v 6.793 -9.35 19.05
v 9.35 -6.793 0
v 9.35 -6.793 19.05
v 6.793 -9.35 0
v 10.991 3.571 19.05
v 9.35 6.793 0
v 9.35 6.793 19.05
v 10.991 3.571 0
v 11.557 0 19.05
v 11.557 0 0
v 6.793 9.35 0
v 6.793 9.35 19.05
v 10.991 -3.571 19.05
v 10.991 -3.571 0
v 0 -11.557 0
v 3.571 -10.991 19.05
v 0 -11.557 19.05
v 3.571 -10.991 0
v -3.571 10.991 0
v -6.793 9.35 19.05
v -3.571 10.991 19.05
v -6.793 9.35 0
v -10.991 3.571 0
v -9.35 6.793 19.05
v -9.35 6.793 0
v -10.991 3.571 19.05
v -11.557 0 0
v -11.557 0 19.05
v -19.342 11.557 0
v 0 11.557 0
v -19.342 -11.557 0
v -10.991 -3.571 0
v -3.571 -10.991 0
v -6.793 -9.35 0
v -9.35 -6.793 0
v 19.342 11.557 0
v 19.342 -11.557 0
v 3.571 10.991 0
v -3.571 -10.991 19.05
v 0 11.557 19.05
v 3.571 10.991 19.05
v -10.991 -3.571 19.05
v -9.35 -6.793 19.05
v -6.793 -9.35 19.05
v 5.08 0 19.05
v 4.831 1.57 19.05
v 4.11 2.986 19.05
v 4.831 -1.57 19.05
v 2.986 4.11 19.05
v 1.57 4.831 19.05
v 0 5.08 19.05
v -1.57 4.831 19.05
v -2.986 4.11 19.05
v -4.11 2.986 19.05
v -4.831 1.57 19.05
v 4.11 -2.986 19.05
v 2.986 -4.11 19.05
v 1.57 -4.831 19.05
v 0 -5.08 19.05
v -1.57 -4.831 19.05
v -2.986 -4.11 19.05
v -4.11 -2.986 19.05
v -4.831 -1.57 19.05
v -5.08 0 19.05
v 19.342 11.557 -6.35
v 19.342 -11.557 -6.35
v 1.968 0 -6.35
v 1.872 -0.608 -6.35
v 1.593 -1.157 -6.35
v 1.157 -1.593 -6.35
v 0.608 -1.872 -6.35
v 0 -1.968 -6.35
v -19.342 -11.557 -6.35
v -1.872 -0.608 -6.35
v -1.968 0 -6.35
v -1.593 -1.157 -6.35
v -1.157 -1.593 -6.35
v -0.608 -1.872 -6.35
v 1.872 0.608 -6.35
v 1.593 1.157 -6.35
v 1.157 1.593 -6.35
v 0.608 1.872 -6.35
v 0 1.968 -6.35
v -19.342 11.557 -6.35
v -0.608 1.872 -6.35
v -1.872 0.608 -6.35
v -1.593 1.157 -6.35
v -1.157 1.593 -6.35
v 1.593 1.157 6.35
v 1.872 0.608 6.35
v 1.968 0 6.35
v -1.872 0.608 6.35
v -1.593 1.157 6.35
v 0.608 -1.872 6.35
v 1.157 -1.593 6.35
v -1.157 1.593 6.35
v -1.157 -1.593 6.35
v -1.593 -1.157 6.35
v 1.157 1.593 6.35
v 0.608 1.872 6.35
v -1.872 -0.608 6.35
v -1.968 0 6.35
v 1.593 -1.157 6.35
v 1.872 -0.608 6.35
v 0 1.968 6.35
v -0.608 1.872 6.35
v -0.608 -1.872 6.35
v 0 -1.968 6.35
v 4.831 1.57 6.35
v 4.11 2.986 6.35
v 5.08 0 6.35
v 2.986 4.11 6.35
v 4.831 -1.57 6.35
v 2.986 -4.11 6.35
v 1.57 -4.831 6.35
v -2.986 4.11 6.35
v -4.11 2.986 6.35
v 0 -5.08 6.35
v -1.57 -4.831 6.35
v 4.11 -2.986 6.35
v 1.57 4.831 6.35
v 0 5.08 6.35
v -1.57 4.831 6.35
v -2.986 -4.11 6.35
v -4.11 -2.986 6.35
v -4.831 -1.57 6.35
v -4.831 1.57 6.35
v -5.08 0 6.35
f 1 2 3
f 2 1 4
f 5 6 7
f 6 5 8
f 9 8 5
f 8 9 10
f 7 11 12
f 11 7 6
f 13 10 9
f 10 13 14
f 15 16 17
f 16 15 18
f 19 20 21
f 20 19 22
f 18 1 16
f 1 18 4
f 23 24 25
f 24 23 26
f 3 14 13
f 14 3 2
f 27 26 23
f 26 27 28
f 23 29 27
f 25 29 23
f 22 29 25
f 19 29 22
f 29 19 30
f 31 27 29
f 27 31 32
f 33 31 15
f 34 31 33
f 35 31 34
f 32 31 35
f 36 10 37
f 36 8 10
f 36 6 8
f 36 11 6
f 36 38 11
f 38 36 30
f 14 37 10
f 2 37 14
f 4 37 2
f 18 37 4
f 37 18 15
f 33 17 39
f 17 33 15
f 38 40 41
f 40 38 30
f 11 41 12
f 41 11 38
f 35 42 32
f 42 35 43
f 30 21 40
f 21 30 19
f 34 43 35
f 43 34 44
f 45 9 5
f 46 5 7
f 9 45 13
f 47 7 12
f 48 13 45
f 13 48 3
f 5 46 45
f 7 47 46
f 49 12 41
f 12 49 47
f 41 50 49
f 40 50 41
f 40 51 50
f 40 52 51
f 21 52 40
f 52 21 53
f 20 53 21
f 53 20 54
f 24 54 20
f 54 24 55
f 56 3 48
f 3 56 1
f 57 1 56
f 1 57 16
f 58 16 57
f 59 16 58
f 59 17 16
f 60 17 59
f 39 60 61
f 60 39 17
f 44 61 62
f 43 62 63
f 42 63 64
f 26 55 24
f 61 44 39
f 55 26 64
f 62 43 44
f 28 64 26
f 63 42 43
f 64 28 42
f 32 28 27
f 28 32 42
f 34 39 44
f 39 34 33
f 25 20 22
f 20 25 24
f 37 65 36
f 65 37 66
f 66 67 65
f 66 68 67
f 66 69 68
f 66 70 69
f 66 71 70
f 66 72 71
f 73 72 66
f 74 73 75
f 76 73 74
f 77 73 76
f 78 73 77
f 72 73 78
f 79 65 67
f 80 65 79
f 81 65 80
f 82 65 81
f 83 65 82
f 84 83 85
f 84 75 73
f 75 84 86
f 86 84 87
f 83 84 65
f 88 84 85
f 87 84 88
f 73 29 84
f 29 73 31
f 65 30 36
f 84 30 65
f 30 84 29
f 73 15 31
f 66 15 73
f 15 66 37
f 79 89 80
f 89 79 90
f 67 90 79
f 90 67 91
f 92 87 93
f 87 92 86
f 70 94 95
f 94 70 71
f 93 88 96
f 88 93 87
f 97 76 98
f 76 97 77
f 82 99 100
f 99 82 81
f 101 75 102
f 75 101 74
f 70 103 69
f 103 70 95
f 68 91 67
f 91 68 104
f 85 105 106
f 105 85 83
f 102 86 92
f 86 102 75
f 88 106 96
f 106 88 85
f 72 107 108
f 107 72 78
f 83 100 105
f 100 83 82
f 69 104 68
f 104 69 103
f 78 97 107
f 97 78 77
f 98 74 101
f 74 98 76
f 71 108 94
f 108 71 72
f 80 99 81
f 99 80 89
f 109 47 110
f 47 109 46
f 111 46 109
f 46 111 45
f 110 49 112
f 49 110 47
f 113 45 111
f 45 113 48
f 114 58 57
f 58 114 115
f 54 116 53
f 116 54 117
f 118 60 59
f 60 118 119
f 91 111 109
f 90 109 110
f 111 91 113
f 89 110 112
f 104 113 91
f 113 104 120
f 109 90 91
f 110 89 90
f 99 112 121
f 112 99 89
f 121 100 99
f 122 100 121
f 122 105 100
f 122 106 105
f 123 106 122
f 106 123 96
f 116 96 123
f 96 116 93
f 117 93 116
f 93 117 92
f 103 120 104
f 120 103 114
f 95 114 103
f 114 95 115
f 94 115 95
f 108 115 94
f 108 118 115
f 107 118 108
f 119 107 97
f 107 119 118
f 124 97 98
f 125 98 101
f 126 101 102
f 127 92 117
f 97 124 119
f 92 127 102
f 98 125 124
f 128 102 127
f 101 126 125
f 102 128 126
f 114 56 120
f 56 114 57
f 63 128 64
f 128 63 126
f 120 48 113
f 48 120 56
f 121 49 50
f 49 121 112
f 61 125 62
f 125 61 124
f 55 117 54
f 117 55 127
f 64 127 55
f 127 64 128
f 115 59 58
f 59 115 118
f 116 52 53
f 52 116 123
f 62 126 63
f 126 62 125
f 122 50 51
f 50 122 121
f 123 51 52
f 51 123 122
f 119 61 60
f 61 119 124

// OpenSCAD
// file: Vitamins/Pipe.scad
//
// Pipe dimensions
//

// 1/8" Pipe
1_8_pipe_od = 0.415;
1_8_pipe_id = 0.265;

// 3/4" Pipe
3_4_pipe_id              = 0.81;
3_4_pipe_od              = 1.05;
3_4_pipe_tapered_od      = 1.018;
3_4_pipe_thread_length   = 0.9;
3_4_pipe_depth           = 0.5; // Depth when fully screwed into a fitting
3_4_pipe_clearance       = 0.015;
3_4_pipe_clearance_loose = 0.027;
3_4_pipe_wall            = (3_4_pipe_od - 3_4_pipe_id)/2;

// 1" Pipe
1_pipe_id              = 1.06;
1_pipe_od              = 1.325;
1_pipe_tapered_od      = 1.285;  // Threaded portion of the pipe, smallest OD
1_pipe_thread_length   = 0.982;  // Length of the threads, measured from the end of the pipe to the last thread mark
1_pipe_clearance       = 0.02;
1_pipe_clearance_loose = 0.03;
1_pipe_wall            = (1_pipe_od - 1_pipe_id)/2;

// 3/4" Tee
3_4_tee_diameter  = 1.38; // Diameter of the body, behind the rim
3_4_tee_width     = 2.64; // Across the top of the T
3_4_tee_height    = 2.01; // From the middle of the bottom rim to the top of the body
3_4_tee_id        = 0.91;
3_4_tee_rim_od    = 1.523;
3_4_tee_rim_width = 0.37;
3_4_tee_center_z  = 3_4_tee_height - (3_4_tee_diameter/2); // Centerline of the T
3_4_tee_rim_z_min = 3_4_tee_center_z - (3_4_tee_rim_od/2); // Bottom of the T rims
3_4_tee_rim_z_max = 3_4_tee_center_z + (3_4_tee_rim_od/2); // Top of the T rims

// 3/4" x 1/8" Bushing
3_4_x_1_8_bushing_height      = 0.95;
3_4_x_1_8_bushing_id          = 0.45;
3_4_x_1_8_bushing_od          = 1.0;
3_4_x_1_8_bushing_head_height = 0.22;
3_4_x_1_8_bushing_head_od     = 1.215;
3_4_x_1_8_bushing_head_id     = 1.06;
3_4_x_1_8_bushing_depth       = 0.5;

module bushing(id, od, height, head_major_width, head_height) {
  difference() {
    union() {

      // Body
      translate([0,0,head_height/2])
      cylinder(r=od/2, h=height - (head_height/2));

      // Head
      cylinder(r=head_major_width/2, h=head_height, $fn=6);
    }

    // Hole
    translate([0,0,-1])
    cylinder(r=id/2, h=height + 2);
  }
};

module pipe(id=1, od=2, length=1, hollow=true, cutter=false, clearance=0.1) {
  difference() {

    // Create the pipe wall
    if (cutter) {
      cylinder(r=(od + clearance)/2, h=length);
    } else {
      cylinder(r=od/2, h=length);
    }

    // Hollow it out
    if (hollow) {
      translate([0,0,-1])
      cylinder(r=id/2, h=length + 2);
    }
  }
};

module 3_4_pipe(length=1, hollow=true, cutter=false, loose=false) {
  clearance = loose ? 3_4_pipe_clearance_loose : 3_4_pipe_clearance;

  pipe(id=3_4_pipe_id, od=3_4_pipe_od, clearance=clearance,
       length=length, hollow=hollow, cutter=cutter);
};

module 1_pipe(length=1, hollow=true, cutter=false, loose=false) {
  clearance = loose ? 1_pipe_clearance_loose : 1_pipe_clearance;

  pipe(id=1_pipe_id, od=1_pipe_od, clearance=clearance,
       length=length, hollow=hollow, cutter=cutter);
};

module pipe_sleeve(length=1,wall=1,hole=1, clearance=0) {
  difference() {
    cylinder(r=hole/2 + wall, h=length);

    translate([0,0,-0.1])
    cylinder(r=hole/2 + clearance, h=length + 0.2);
  }
};

module 3_4_pipe_sleeve(length=1,wall=1) {
  pipe_sleeve(hole=3_4_pipe_od, length = length, wall = wall, clearance = 3_4_pipe_clearance);
};

module 1_pipe_sleeve(length=1,wall=1) {
  pipe_sleeve(hole=1_pipe_od, length = length, wall = wall, clearance = 1_pipe_clearance);
};

module nested_pipe_sleeve(minor_id=1, minor_length=1, major_id=2, major_length=2, minor_clearance=0, major_clearance=0, wall=1) {
    difference() {
      cylinder(r=major_id/2 + wall, h=minor_length + major_length);

      // Minor Hole
      translate([0,0,-0.1])
      cylinder(r=(minor_id+minor_clearance)/2, h=minor_length + 0.2);

      // Major Hole (1" pipe)
      translate([0,0,minor_length])
      cylinder(r=(major_id+major_clearance)/2, h=major_length + 0.1);
    }
}

module 134_nested_pipe_sleeve(major_length = 2, minor_length=1, wall=1) {
  nested_pipe_sleeve(minor_id=3_4_pipe_od, major_id=1_pipe_od,
                     minor_clearance=3_4_pipe_clearance, major_clearance=1_pipe_clearance,
                     minor_length=minor_length, major_length=major_length, wall=wall);
}

module 1_pipe_tapered(length=2) {
  union() {

    // Thread taper
    rotate([0,90,0])
    color("Orange")
    cylinder(r=1_pipe_tapered_od/2, r2=1_pipe_od/2, h=1_pipe_thread_length);

    // Extra pipe length
    translate([1_pipe_thread_length,0,0])
    rotate([0,90,0])
    color("Blue")
    cylinder(r=1_pipe_od/2, h=length - 1_pipe_thread_length);
  }
};

module tee(width, height, od, id, rim_od, rim_width, cutout = false) {
  difference() {
    union() {

      // T-Top
      rotate([0,-90,0])
      translate([height - (od/2),0,0])
      cylinder(r=od/2, h=width * 0.99, center=true);

      // T-Bottom
      translate([0,0,(height - (od/2)) * 0.01])
      cylinder(r=od/2, h=(height - (od/2)) * 0.98);

      // Bottom rim
      cylinder(r=rim_od/2, h=rim_width);

      // Left rim
      rotate([0,90,0])
      translate([-(height - (od/2)),0,-width/2])
      cylinder(r=rim_od/2, h=rim_width);

      // Right rim
      rotate([0,-90,0])
      translate([height - (od/2),0,-width/2])
      cylinder(r=rim_od/2, h=rim_width);
    }

    // Top Hole
    rotate([0,-90,0])
    translate([height - (od/2),0,0])
    cylinder(r=id/2, h=width * 1.05, center=true);

    // Bottom Hole
    translate([0,0,-height * 0.01])
    cylinder(r=id/2, h=height - (od/2) * 1.01);

    // Cutout
    if (cutout) {
       translate([-width/1.8,-od,-height*0.05])
      cube([width * 1.1, od * 1.1, height * 1.1]);
    }
  }
};

module 3_4_tee(width=3_4_tee_width,
               height=3_4_tee_height,
               od=3_4_tee_diameter,
               id=0,
               rim_od=3_4_tee_rim_od,
               rim_width=3_4_tee_rim_width,
               cutout=false) {
  $fn = 30;

  tee(width=width,
       height=height,
       od=od,
       id=id,
       rim_od=rim_od,
       rim_width=rim_width,
       cutout=cutout);
};


*3_4_tee();


scale([25.4, 25.4, 25.4])
*3_4_pipe_sleeve(wall=1/8, length=1/2, $fn=30);
// file: Vitamins/Rod.scad
// 1/8" Rod
1_8_rod_d         = 1/8;
1_8_rod_r         = 1_8_rod_d/2;
1_8_rod_clearance = 0.03; // TODO

// 1/4" Rod
1_4_rod_d                = 1/4;
1_4_rod_r                = 1_4_rod_d/2;
1_4_rod_clearance        = 0.02; // TODO
1_4_rod_collar_d         = 1/2;
1_4_rod_collar_width     = 0.27;
1_4_rod_collar_clearance = 0.0; // TODO

// 5/16" Rod
5_16_rod_d         = 5/16;
5_16_rod_r         = 5_16_rod_d/2;
5_16_rod_clearance = 0.02; // TODO

module rod(diameter=1, length=1, clearance=0, cutter=false, $fn=20) {
  if (cutter) {
    cylinder(r=(diameter+clearance)/2, h=length);
  } else {
    cylinder(r=diameter/2, h=length);
  }
}

module 1_8_rod(length=1, cutter=false) {
  rod(diameter=1_8_rod_d, clearance=1_8_rod_clearance, length=length, cutter=cutter);
}

module 1_4_rod(length=1, cutter=false) {
  rod(diameter=1_4_rod_d, clearance=1_4_rod_clearance, length=length, cutter=cutter);
}

module 1_4_rod_collar(cutter=false) {
  rod(diameter=1_4_rod_collar_d, clearance=1_4_rod_collar_clearance, cutter=cutter, length=1_4_rod_collar_width);
}

module 5_16_rod(length=1, cutter=false) {
  rod(diameter=5_16_rod_d, clearance=5_16_rod_clearance, length=length, cutter=cutter);
}
// main file
include <Vitamins/Rod.scad>;
include <Vitamins/Pipe.scad>;

module firing_pin_guide(od=3_4_tee_id, minor_height = 1/4, major_height = 1/2) {

  // 1/8" Rod on 1/4" Rod
  difference() {
    union() {
      #cylinder(r=od/2, h=major_height + minor_height, $fn=20);

      translate([-3_4_tee_rim_od/2,-3_4_tee_id/2,-1/4])
      #cube([3_4_tee_rim_od,3_4_tee_id,1/4]);
    }

    translate([0,0,-0.5])
    #1_8_rod(length=minor_height + 1, cutter=true, loose=true);

    translate([0,0,minor_height])
    cylinder(r=0.4/2, h=major_height + 0.1, $fn=20);
  }
}

scale([25.4, 25.4, 25.4])
firing_pin_guide();
